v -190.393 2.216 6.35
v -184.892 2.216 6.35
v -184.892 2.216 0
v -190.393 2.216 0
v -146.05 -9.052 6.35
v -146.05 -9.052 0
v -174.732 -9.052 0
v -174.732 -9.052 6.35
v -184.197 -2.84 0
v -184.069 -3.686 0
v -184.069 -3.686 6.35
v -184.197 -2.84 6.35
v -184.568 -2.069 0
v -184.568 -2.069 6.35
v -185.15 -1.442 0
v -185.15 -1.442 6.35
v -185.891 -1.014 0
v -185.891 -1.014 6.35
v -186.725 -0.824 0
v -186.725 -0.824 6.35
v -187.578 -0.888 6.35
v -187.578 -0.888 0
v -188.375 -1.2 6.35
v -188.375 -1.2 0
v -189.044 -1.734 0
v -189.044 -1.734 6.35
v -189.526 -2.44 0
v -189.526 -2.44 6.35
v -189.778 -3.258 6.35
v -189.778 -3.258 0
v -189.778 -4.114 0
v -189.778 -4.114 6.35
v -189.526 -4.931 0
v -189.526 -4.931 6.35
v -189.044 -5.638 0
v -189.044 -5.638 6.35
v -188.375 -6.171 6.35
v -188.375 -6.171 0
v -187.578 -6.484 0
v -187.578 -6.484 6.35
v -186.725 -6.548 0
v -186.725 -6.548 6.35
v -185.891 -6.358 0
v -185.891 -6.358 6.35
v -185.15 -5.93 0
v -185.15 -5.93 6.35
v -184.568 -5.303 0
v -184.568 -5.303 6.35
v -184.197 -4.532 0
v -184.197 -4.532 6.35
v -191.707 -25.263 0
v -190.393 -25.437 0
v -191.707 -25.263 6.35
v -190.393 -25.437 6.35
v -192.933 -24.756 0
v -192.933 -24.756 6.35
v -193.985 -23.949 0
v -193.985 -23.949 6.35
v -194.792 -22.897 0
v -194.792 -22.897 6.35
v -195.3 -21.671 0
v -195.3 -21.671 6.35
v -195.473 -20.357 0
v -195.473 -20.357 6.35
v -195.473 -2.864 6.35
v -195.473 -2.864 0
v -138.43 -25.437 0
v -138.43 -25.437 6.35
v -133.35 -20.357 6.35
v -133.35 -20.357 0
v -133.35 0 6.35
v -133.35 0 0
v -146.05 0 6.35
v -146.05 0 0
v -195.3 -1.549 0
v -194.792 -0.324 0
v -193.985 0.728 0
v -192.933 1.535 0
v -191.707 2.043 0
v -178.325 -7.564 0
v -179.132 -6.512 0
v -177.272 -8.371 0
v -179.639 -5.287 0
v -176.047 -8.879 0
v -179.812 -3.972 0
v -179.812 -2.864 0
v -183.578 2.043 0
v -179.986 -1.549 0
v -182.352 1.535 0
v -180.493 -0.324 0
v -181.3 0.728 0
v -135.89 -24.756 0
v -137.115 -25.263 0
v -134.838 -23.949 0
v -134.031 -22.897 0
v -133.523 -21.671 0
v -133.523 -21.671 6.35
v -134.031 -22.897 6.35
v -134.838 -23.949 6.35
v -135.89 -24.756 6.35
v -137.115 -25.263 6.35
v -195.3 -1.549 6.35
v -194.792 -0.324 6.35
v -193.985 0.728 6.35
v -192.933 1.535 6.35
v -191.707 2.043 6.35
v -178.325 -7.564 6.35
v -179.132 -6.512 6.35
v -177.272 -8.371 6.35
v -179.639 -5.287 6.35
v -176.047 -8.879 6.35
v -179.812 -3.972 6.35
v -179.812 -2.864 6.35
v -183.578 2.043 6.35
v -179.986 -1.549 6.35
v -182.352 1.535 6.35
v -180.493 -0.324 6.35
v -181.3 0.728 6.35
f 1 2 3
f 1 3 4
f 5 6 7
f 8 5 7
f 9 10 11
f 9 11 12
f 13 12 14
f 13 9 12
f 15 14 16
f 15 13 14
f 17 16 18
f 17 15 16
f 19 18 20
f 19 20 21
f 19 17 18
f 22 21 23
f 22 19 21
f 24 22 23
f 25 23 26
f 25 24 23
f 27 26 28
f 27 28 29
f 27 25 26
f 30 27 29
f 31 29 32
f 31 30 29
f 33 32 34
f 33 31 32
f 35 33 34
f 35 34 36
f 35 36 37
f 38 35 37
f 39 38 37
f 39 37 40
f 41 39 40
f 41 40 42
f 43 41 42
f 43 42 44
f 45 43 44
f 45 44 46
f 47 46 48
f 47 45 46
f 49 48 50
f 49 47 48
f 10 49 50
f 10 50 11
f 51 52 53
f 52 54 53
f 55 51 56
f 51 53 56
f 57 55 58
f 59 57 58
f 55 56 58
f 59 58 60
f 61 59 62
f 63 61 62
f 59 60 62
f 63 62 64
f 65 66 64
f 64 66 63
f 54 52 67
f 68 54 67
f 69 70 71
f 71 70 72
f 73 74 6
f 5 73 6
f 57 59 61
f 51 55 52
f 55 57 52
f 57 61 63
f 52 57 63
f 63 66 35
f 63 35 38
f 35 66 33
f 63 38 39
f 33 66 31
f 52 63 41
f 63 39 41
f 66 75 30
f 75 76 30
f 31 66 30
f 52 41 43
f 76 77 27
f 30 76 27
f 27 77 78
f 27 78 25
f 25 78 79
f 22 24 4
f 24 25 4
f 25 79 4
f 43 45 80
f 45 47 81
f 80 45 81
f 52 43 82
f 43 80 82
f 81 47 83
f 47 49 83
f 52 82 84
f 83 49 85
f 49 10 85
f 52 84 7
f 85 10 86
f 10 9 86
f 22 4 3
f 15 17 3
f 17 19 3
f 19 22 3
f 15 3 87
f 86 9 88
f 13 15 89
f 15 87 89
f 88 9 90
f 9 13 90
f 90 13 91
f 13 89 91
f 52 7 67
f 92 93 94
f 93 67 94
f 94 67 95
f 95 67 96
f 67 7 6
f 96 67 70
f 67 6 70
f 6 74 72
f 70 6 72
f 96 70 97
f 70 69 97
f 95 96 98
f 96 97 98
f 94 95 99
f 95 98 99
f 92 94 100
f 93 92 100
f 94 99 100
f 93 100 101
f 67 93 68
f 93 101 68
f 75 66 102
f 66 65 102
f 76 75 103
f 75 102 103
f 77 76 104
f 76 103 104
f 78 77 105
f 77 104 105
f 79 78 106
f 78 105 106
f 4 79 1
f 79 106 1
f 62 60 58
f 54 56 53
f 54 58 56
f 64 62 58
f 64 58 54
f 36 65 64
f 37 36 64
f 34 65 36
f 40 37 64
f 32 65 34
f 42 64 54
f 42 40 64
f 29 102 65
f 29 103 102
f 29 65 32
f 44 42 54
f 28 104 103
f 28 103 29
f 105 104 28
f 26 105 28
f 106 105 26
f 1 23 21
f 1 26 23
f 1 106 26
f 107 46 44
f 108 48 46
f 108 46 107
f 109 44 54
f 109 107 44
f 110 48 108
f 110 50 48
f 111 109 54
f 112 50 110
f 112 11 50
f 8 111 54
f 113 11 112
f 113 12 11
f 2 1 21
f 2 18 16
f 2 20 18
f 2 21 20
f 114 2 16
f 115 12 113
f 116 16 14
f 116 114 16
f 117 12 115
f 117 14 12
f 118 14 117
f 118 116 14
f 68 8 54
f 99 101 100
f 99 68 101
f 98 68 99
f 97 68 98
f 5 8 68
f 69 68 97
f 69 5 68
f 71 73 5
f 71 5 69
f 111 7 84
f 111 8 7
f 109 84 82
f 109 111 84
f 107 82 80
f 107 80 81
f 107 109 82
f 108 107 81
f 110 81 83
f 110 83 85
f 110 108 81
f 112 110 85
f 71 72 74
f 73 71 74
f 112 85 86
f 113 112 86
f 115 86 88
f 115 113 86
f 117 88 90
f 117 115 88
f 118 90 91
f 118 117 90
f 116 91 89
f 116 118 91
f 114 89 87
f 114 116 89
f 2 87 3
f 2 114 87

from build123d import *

# Parameters (mm, degrees)
SKETCH1_R           = 2.8702
BOSS_EXTRUDE1_DEPTH = 6.35
FILLET1_R           = 5.08


with BuildPart() as part:
    # Sketch1 → Boss-Extrude1 (new body)
    with BuildSketch(Plane.XY):
        Polygon((-133.35, 0), (-146.05, 0), (-146.05, -6.35), (-146.05, -9.05192086), (-179.812411975, -9.05192086), (-179.812411975, 2.216051439), (-195.472684717, 2.216051439), (-195.472684717, -16.678421964), (-195.472684717, -25.43652623), (-146.05, -25.43652623), (-133.35, -25.43652623), (-133.35, -6.35), align=None)
        with Locations((-186.939684717, -3.685756589)):
            Circle(SKETCH1_R, mode=Mode.SUBTRACT)
    extrude(amount=BOSS_EXTRUDE1_DEPTH)

    # Fillet1
    fillet1_edges = [part.edges().sort_by_distance(p)[0] for p in [
        (-133.35, -25.43652623, 3.175),
        (-195.472684717, -25.43652623, 3.175),
        (-195.472684717, 2.216051439, 3.175),
        (-179.812411975, 2.216051439, 3.175),
        (-179.812411975, -9.05192086, 3.175),
    ]]
    fillet(fillet1_edges, radius=FILLET1_R)


solid = part.part
